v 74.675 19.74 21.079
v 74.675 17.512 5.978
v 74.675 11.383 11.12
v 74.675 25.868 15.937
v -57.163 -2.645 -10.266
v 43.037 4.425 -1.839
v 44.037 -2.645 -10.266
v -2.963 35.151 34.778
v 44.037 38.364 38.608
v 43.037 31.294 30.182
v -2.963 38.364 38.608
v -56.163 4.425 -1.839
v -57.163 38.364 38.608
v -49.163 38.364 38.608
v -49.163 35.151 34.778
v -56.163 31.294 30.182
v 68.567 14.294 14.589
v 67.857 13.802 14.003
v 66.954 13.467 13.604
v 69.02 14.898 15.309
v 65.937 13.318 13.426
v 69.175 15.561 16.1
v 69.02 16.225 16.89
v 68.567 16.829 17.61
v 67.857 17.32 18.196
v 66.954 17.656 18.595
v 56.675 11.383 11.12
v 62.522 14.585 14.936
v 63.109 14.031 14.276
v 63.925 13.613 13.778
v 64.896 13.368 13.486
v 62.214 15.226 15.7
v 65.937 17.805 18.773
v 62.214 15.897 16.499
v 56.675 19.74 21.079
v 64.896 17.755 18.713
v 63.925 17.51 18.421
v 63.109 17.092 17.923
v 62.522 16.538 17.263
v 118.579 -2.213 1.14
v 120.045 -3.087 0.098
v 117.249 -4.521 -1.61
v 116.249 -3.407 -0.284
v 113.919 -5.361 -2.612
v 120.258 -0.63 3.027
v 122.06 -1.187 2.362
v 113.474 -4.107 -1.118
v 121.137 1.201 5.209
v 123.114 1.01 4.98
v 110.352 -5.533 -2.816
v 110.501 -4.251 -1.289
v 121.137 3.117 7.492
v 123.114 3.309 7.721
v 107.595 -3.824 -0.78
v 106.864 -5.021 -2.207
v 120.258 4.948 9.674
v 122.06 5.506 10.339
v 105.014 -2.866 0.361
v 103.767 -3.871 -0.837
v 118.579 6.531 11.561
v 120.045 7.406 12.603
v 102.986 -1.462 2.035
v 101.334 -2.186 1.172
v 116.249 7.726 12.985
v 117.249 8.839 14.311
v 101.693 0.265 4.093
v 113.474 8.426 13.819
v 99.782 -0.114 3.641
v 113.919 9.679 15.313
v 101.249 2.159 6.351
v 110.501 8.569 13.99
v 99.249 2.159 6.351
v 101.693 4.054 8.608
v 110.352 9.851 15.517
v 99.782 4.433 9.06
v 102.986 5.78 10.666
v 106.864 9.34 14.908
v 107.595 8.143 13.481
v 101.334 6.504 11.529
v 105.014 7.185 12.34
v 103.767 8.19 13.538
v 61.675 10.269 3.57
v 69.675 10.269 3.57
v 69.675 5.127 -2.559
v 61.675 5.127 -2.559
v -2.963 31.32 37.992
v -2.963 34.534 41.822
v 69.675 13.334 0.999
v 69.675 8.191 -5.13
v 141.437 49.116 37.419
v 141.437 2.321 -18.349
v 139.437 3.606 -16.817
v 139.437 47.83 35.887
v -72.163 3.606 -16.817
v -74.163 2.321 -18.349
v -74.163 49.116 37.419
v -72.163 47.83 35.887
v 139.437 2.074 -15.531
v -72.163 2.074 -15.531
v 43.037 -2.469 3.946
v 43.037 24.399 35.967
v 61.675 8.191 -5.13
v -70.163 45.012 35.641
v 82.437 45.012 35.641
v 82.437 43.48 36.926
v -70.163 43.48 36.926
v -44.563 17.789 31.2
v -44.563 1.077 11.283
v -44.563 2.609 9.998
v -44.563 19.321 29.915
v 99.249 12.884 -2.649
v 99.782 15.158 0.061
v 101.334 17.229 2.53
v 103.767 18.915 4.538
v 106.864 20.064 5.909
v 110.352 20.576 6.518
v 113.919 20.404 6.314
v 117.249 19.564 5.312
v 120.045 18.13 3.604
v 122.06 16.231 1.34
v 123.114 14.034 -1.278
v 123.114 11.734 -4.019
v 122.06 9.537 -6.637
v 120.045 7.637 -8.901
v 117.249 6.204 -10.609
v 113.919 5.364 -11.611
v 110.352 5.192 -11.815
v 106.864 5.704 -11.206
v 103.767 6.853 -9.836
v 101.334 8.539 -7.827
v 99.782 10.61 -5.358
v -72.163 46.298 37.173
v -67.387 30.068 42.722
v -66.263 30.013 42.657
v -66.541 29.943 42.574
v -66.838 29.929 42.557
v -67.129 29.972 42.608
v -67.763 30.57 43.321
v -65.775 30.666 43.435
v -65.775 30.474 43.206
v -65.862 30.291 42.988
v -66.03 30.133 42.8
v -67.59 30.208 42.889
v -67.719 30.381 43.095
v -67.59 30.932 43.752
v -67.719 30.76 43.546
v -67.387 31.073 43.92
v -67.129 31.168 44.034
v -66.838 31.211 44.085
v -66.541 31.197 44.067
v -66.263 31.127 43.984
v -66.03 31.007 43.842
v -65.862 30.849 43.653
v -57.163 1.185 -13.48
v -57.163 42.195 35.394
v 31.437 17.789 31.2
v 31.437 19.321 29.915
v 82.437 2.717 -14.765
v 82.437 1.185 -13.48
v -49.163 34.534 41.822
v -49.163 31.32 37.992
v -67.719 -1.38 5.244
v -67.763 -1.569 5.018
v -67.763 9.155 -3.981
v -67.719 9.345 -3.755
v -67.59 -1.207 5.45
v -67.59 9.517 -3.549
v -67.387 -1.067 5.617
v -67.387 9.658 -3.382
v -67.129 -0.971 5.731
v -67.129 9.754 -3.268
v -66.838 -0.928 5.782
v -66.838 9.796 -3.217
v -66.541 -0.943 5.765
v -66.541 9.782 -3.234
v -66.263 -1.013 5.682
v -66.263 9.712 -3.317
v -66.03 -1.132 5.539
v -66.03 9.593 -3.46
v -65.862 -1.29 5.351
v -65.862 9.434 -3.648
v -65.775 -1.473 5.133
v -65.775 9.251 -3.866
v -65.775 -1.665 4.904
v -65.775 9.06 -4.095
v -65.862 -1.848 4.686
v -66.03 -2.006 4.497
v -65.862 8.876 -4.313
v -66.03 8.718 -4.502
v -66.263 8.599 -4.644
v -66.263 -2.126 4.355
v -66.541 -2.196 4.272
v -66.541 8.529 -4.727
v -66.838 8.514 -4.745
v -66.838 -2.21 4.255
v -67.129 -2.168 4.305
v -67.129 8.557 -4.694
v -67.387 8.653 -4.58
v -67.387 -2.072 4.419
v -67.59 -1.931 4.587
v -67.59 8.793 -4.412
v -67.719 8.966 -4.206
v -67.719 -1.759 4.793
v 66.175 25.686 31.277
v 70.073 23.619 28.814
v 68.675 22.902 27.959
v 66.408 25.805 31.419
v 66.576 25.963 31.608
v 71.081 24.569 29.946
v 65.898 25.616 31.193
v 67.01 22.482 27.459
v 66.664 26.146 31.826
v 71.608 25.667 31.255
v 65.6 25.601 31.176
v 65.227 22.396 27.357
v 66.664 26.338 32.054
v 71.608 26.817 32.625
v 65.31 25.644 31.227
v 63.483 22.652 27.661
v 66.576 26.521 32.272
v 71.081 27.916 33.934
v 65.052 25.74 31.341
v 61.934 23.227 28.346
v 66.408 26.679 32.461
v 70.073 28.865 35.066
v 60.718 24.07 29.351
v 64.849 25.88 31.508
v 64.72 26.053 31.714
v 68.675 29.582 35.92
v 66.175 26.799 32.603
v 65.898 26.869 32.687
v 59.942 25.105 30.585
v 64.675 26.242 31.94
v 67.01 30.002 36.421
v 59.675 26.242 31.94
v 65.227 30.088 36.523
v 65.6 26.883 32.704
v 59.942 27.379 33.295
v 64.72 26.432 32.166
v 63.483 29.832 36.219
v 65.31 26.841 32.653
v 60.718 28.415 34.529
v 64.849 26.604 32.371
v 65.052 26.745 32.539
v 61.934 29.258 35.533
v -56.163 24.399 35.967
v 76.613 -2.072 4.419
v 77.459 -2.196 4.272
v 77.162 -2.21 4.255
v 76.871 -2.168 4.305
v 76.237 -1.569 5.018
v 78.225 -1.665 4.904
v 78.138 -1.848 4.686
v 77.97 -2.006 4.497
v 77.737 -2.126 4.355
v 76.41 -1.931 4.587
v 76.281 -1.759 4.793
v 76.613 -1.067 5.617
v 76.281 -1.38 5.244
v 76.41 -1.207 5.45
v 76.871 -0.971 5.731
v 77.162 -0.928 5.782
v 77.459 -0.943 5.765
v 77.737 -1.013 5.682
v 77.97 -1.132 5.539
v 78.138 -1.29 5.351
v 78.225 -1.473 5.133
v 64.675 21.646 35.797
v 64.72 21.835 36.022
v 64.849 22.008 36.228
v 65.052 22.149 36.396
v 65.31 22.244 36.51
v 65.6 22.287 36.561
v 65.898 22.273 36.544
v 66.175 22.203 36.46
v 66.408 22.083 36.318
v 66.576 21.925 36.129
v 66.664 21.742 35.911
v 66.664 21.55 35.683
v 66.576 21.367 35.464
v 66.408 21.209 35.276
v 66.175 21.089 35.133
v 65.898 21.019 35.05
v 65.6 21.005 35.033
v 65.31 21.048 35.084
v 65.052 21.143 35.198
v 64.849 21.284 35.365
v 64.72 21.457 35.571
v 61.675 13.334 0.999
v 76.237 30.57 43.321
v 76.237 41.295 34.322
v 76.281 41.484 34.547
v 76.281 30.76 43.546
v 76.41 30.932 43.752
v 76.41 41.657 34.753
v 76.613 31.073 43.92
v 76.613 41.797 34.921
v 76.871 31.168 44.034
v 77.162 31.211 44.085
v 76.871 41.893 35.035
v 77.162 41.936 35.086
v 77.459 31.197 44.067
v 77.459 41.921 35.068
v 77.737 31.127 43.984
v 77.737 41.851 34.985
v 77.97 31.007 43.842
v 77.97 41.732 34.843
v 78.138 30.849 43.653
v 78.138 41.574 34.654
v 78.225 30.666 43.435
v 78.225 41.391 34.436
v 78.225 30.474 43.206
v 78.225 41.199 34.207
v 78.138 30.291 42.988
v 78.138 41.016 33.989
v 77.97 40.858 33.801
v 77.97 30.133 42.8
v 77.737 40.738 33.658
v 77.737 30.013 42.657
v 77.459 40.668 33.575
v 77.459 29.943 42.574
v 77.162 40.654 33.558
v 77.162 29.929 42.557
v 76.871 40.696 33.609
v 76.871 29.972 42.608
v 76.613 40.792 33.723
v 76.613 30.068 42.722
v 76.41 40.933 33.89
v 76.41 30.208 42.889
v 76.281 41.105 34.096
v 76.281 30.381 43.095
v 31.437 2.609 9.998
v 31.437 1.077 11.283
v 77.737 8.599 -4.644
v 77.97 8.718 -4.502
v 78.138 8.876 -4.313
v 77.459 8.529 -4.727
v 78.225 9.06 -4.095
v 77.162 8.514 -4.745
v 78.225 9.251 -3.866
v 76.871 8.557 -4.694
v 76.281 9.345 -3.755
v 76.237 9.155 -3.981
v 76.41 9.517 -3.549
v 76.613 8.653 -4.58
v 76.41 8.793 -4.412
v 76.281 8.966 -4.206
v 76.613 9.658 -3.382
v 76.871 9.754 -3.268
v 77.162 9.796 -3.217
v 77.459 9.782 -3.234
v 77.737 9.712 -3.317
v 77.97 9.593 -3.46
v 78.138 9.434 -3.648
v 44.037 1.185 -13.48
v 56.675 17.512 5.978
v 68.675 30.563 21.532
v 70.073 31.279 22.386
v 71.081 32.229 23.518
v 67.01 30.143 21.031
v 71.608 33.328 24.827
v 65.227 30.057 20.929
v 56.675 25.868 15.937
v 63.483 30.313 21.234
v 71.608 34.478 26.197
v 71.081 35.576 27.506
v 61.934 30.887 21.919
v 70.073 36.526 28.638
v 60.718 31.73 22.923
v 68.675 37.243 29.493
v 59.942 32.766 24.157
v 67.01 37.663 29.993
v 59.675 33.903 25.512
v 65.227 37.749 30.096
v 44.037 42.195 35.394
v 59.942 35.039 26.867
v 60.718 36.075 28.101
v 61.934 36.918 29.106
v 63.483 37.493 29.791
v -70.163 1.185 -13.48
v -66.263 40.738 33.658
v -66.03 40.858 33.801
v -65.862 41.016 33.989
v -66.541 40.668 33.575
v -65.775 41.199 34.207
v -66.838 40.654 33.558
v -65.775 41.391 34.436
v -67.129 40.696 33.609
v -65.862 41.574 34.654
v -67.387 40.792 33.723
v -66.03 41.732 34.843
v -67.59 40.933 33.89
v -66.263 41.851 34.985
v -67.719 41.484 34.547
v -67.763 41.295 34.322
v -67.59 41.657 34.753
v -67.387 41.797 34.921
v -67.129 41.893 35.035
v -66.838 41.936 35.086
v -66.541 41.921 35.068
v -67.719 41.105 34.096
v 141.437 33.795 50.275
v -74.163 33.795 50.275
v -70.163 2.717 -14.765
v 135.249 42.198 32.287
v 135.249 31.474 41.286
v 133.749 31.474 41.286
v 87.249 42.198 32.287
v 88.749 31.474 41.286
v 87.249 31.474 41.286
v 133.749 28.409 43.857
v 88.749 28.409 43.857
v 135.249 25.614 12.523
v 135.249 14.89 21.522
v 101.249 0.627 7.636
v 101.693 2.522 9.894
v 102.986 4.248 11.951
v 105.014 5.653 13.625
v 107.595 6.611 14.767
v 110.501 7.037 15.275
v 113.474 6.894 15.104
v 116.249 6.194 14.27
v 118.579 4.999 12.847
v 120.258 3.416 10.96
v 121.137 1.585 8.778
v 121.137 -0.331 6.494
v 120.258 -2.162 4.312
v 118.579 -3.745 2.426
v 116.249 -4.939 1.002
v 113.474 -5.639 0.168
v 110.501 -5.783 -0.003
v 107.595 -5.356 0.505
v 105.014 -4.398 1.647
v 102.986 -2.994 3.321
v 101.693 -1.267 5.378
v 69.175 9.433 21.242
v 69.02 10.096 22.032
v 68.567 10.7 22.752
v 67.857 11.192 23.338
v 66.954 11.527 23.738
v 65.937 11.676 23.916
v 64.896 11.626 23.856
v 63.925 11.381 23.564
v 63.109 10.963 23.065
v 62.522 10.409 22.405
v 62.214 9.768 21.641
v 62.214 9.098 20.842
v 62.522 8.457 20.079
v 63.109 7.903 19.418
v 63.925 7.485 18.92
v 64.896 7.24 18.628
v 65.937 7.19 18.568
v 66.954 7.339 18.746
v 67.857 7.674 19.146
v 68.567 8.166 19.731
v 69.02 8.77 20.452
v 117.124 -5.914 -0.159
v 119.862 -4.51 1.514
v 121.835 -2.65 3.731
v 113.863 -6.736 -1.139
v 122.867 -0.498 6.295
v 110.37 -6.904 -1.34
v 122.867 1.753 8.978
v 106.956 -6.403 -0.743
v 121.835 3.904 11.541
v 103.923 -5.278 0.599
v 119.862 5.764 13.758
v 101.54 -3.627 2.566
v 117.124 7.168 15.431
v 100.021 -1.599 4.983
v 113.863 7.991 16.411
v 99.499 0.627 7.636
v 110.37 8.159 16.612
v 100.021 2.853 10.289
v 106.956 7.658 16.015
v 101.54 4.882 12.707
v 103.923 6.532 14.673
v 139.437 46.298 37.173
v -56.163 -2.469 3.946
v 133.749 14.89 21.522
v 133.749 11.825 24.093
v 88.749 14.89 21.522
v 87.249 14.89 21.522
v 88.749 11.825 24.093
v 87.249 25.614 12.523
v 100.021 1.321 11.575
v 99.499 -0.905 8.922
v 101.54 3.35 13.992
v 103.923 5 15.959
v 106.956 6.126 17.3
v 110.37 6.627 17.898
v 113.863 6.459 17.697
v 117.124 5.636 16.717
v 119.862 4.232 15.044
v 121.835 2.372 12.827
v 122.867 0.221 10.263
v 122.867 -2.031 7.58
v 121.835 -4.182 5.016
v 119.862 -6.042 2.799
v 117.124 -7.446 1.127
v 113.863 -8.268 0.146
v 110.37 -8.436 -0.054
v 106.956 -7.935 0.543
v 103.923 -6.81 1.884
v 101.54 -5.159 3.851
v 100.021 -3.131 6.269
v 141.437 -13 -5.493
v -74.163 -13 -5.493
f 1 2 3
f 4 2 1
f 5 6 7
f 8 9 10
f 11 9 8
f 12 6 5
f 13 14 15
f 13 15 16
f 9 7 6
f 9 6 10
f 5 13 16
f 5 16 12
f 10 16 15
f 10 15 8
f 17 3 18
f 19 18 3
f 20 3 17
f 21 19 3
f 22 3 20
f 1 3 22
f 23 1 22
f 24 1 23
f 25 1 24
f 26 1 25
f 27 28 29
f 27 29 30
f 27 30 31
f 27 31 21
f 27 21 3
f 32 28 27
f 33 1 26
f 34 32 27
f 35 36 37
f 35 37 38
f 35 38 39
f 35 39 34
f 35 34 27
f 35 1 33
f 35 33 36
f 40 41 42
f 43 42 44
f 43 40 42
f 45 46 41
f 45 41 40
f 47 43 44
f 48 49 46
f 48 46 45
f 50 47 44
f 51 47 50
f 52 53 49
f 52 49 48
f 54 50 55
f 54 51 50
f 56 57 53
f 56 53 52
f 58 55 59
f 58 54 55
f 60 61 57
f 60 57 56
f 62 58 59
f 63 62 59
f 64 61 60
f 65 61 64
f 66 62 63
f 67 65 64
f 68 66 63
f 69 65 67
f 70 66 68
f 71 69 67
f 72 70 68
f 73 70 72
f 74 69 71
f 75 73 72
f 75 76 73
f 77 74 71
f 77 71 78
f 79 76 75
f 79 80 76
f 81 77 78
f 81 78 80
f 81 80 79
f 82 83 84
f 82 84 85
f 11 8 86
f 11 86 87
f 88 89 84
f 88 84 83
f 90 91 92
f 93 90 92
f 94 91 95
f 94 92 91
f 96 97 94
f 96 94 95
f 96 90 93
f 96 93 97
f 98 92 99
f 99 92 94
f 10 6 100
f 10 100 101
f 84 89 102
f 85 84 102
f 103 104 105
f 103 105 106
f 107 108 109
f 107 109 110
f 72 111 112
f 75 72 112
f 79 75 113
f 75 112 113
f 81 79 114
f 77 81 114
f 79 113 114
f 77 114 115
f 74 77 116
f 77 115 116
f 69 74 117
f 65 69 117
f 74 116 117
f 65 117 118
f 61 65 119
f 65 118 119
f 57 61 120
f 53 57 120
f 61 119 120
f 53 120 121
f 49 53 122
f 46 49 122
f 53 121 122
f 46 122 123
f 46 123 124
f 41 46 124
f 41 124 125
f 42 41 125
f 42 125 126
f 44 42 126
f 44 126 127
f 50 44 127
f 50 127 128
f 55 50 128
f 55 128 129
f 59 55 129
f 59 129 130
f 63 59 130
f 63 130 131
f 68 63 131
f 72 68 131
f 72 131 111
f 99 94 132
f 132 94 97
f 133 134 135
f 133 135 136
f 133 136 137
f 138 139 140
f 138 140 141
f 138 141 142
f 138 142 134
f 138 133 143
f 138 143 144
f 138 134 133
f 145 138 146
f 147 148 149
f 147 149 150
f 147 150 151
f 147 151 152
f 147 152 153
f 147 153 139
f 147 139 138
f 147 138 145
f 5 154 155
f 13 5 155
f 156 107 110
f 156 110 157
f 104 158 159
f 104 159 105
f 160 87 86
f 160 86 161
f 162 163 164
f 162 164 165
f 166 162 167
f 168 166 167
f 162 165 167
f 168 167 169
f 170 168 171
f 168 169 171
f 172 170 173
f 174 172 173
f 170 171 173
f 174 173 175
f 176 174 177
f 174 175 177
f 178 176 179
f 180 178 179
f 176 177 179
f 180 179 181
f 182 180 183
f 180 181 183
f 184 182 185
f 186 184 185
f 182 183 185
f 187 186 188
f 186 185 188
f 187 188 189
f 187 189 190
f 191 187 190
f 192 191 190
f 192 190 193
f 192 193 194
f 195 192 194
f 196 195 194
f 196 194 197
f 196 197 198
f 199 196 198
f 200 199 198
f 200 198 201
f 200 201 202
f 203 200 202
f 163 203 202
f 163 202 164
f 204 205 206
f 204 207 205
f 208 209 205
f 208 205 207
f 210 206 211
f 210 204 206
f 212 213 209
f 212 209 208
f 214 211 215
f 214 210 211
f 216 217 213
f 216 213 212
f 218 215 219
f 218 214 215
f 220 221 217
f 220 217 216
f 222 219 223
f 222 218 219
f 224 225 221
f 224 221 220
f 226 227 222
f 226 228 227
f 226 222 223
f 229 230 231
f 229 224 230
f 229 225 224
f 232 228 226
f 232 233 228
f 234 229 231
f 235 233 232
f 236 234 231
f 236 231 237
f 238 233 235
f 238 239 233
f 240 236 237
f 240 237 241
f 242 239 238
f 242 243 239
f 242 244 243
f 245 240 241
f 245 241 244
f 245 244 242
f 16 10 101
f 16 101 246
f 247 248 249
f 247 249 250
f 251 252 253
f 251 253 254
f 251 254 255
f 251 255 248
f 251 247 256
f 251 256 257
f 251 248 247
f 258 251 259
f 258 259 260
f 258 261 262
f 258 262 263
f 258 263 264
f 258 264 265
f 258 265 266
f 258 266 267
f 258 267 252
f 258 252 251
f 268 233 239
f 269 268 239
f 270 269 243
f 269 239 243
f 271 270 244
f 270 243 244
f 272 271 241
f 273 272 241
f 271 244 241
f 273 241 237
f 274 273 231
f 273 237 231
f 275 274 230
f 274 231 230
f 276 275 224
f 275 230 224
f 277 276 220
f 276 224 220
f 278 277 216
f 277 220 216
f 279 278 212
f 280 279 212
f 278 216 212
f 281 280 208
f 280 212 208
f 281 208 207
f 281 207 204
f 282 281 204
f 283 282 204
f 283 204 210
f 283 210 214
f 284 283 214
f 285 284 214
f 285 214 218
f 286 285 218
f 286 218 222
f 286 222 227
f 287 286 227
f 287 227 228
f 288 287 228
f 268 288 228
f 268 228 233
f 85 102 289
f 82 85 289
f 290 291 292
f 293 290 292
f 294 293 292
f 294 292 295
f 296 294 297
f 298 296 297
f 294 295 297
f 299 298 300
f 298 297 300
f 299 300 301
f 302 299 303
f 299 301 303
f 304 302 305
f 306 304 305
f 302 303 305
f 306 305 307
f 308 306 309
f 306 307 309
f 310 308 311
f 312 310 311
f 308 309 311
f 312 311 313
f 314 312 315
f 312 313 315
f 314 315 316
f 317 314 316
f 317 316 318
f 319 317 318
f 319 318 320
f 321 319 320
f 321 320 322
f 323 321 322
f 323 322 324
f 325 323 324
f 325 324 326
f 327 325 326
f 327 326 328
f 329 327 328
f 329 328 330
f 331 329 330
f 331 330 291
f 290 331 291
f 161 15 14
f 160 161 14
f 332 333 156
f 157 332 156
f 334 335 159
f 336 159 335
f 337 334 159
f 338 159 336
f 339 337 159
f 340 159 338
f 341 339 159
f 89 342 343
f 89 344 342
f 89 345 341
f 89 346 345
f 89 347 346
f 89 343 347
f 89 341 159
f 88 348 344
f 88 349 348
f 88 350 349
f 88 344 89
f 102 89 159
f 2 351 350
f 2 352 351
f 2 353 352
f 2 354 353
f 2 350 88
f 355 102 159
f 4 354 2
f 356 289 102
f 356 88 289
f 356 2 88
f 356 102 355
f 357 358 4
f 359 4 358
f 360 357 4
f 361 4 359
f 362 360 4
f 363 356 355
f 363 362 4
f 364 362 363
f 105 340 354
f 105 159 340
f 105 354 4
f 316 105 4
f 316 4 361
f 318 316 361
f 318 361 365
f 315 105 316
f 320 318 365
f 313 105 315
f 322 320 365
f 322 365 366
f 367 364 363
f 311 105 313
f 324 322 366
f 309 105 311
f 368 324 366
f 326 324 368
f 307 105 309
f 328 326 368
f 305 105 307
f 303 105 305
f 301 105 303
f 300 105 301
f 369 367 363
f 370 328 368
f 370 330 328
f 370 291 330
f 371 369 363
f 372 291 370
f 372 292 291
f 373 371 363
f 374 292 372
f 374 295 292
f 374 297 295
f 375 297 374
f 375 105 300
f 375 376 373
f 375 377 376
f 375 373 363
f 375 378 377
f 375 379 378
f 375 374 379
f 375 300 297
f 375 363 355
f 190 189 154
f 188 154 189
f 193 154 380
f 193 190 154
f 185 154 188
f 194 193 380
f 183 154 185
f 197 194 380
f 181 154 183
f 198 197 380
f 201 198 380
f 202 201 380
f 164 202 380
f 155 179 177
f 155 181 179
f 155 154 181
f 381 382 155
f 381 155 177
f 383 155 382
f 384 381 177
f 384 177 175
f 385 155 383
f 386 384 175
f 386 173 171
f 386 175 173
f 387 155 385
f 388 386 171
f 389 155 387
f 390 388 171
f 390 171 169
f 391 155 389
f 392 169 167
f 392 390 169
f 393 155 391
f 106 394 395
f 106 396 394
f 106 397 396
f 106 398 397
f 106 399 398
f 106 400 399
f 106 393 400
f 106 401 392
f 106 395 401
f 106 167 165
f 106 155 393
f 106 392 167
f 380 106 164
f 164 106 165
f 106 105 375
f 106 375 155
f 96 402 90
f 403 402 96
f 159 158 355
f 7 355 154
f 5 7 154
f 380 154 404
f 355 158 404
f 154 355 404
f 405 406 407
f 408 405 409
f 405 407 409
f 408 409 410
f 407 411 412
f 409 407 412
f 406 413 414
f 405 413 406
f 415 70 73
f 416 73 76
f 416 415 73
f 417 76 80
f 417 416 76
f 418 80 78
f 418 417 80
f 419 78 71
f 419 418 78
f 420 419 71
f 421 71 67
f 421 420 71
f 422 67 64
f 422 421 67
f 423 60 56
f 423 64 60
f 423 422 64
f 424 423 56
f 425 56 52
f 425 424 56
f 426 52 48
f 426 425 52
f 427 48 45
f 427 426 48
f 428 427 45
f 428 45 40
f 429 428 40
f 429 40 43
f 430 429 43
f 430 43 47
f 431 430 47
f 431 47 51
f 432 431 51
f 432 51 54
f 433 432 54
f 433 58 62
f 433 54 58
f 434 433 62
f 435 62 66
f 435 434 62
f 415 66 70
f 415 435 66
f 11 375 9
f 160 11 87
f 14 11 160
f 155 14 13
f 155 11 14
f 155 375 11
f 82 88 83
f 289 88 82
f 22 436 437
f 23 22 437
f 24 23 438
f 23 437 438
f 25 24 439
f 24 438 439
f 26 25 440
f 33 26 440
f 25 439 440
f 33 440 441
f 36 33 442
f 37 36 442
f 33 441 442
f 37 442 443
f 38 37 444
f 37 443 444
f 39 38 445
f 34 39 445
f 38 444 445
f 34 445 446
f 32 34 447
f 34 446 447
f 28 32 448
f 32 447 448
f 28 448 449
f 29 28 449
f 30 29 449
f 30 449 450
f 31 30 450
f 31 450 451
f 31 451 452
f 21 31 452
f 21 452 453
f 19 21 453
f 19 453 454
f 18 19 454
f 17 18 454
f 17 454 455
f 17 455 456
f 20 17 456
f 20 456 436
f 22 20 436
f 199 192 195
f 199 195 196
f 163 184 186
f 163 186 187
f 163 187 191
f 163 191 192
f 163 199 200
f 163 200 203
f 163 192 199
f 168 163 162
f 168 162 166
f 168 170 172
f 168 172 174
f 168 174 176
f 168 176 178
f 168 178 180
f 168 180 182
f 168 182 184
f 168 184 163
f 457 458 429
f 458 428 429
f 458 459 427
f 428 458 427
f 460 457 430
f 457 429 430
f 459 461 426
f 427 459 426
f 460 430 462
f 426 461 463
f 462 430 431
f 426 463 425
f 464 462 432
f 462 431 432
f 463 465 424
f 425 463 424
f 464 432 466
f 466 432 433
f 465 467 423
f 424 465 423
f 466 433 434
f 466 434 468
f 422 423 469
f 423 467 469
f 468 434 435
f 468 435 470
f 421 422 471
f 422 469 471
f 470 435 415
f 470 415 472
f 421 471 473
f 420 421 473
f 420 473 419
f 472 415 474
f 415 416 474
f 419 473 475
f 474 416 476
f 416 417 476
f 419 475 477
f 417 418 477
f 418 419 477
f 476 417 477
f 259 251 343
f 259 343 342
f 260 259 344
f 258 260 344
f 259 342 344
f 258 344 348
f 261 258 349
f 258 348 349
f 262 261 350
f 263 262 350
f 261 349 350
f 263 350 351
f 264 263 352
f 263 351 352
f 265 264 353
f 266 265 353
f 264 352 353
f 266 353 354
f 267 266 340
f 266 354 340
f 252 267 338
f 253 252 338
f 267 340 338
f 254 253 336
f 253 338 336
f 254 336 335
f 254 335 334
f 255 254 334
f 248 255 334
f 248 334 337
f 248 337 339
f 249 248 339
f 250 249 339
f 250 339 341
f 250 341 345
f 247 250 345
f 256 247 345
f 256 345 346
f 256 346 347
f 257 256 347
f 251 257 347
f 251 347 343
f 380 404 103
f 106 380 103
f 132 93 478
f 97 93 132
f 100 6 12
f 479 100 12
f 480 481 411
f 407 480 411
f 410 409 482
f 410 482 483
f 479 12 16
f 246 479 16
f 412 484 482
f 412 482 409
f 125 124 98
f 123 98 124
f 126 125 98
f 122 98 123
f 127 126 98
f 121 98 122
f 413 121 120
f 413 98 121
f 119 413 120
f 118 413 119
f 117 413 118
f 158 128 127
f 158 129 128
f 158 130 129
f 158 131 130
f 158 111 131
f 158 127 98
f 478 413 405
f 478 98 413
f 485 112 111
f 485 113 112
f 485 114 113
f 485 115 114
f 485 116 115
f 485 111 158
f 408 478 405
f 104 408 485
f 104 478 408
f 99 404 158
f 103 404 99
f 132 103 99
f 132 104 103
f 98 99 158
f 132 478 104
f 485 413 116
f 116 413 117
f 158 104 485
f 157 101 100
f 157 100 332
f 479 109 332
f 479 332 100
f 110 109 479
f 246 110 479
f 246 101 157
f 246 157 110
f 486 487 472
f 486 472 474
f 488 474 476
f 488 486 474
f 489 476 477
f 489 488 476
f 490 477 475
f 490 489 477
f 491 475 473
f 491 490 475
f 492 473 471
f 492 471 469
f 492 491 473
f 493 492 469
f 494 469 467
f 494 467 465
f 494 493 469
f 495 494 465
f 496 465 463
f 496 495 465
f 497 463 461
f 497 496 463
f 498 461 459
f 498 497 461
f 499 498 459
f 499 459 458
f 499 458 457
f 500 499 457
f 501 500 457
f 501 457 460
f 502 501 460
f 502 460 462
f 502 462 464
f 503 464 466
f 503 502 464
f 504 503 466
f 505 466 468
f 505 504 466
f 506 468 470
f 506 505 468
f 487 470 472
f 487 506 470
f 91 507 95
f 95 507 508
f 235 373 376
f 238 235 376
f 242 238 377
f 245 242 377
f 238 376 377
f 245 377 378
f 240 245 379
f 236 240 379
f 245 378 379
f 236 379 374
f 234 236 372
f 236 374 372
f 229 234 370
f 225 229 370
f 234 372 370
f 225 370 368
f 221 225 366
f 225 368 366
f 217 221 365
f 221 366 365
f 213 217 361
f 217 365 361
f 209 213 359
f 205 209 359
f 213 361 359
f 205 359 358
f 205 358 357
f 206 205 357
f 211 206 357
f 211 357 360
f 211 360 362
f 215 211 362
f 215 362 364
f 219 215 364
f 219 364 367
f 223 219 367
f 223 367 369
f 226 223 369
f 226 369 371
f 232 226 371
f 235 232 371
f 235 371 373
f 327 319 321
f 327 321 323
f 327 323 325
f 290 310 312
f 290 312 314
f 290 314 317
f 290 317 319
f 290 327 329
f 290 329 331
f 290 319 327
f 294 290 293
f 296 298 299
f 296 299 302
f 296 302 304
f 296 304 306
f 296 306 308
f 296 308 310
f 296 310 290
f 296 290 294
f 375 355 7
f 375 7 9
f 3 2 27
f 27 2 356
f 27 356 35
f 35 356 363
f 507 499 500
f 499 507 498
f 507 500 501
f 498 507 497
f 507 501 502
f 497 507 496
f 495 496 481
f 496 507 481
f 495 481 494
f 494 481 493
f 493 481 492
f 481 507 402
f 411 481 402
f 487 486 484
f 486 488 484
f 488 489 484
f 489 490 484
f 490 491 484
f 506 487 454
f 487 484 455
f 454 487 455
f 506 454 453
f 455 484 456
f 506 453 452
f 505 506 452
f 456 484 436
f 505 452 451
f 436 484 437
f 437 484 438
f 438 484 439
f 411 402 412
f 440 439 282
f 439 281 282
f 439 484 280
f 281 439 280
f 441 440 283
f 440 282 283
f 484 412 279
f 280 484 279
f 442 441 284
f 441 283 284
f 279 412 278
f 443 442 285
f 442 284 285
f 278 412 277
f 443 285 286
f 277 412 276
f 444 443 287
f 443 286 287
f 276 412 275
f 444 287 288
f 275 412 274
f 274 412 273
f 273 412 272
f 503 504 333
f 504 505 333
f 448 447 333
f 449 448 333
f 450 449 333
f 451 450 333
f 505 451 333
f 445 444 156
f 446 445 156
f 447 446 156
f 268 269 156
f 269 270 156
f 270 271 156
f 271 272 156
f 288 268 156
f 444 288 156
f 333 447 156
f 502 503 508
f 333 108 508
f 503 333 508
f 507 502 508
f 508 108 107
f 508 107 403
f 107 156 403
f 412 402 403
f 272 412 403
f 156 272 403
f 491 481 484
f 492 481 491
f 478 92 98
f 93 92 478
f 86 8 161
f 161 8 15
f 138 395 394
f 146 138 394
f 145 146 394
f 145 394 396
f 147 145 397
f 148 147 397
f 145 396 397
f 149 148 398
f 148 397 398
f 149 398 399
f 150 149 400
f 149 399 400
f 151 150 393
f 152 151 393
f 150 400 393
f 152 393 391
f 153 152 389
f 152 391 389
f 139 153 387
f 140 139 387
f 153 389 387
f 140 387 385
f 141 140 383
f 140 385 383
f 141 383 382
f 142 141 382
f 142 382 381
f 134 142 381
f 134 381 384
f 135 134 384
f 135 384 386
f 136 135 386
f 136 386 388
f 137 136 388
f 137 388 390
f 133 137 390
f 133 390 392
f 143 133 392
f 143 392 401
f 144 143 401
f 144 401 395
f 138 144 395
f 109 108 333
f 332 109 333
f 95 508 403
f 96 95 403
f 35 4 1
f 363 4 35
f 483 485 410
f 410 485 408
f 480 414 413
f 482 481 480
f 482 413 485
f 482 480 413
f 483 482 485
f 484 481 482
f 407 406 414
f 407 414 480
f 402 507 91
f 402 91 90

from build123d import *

# Parameters (mm, degrees)
F3_W      = 215.6
F3_H      = 72.8
F4_DEPTH  = 20
F5_W      = 76
F5_H      = 26
F5_R      = 3.5
F6_DEPTH  = 55.8480022096
F7_R      = 1
F8_DEPTH  = 18
F9_W      = 99.2
F9_H      = 41.8
F10_DEPTH = 18
F11_R     = 6
F11_R_2   = 1
F12_DEPTH = 14
F13_DEPTH = 55.8480022096
F14_W     = 18
F14_H     = 13
F15_DEPTH = 12
F16_W     = 8
F16_H     = 8
F17_DEPTH = 8
F18_W     = 101.2
F18_H     = 63.8
F19_DEPTH = 9
F20_W     = 46.2
F20_H     = 5
F22_DEPTH = 5
F23_W     = 152.6
F23_H     = 65.8
F24_DEPTH = 4
F25_W     = 45
F25_H     = 25.8
F26_DEPTH = 55.8480022096
F27_W     = 48
F27_H     = 25.8
F28_DEPTH = 16
F29_R     = 10
F30_DEPTH = 55.8480022096
F29_R_2   = 11.75
F31_DEPTH = 2
F32_R     = 12
F33_DEPTH = 16
F34_W     = 211.6
F34_H     = 68.8
F35_DEPTH = 2


with BuildPart() as f4:
    # F3 (on face) → F4 (new body)
    with BuildSketch(Plane(origin=(0, -4.9240387651, 4.1317591117), x_dir=(-1, 0, 0), z_dir=(0, 0.7660444431, -0.6427876097))):
        with Locations((-33.6366042773, 23.835632431)):
            Rectangle(F3_W, F3_H)
    extrude(amount=F4_DEPTH)

    # F5 (on face) → F6 (cut, through all)
    with BuildSketch(Plane(origin=(0, -4.9240387651, 4.1317591117), x_dir=(1, 0, 0), z_dir=(0, -0.7660444431, 0.6427876097))):
        with Locations((-6.5633957227, 22.335632431)):
            Rectangle(F5_W, F5_H)
        with Locations((65.6750798225, 22.335632431)):
            Circle(F5_R)
    extrude(amount=-F6_DEPTH, mode=Mode.SUBTRACT)

    # F7 (on face) → F8 (cut, through all)
    with BuildSketch(Plane(origin=(0, 10.3968500973, -8.7239930821), x_dir=(-1, 0, 0), z_dir=(0, 0.7660444431, -0.6427876097))):
        with Locations((-77.2366042773, 52.835632431)):
            Circle(F7_R)
        with Locations((-77.2366042773, 2.835632431)):
            Circle(F7_R)
        with Locations((66.7633957227, 2.835632431)):
            Circle(F7_R)
        with Locations((66.7633957227, 52.835632431)):
            Circle(F7_R)
    extrude(amount=-F8_DEPTH, mode=Mode.SUBTRACT)

    # F9 (on face) → F10 (cut, through all)
    with BuildSketch(Plane(origin=(0, 10.3968500973, -8.7239930821), x_dir=(-1, 0, 0), z_dir=(0, 0.7660444431, -0.6427876097))):
        with Locations((6.5633957227, 22.335632431)):
            Rectangle(F9_W, F9_H)
    extrude(amount=-F10_DEPTH, mode=Mode.SUBTRACT)

    # F11 (on face) → F12 (cut, through all)
    with BuildSketch(Plane(origin=(0, 10.3968500973, -8.7239930821), x_dir=(-1, 0, 0), z_dir=(0, 0.7660444431, -0.6427876097))):
        with Locations((-65.6750798225, 41.335632431)):
            Circle(F11_R)
        with Locations((-65.6750798225, 41.335632431)):
            Circle(F11_R_2, mode=Mode.SUBTRACT)
        with Locations((-65.6750798225, 41.335632431)):
            Circle(F11_R_2)
    extrude(amount=-F12_DEPTH, mode=Mode.SUBTRACT)

    # F11 (on face) → F13 (cut, through all)
    with BuildSketch(Plane(origin=(0, 10.3968500973, -8.7239930821), x_dir=(-1, 0, 0), z_dir=(0, 0.7660444431, -0.6427876097))):
        with Locations((-65.6750798225, 41.335632431)):
            Circle(F11_R_2)
    extrude(amount=-F13_DEPTH, mode=Mode.SUBTRACT)

    # F14 (on face) → F15 (cut, through all)
    with BuildSketch(Plane(origin=(0, 10.3968500973, -8.7239930821), x_dir=(-1, 0, 0), z_dir=(0, 0.7660444431, -0.6427876097))):
        with Locations((-65.6750798225, 22.335632431)):
            Rectangle(F14_W, F14_H)
    extrude(amount=-F15_DEPTH, mode=Mode.SUBTRACT)

    # F16 (on face) → F17 (cut, through all)
    with BuildSketch(Plane(origin=(0, 10.3968500973, -8.7239930821), x_dir=(-1, 0, 0), z_dir=(0, 0.7660444431, -0.6427876097))):
        with Locations((-65.6750798225, 5.335632431)):
            Rectangle(F16_W, F16_H)
    extrude(amount=-F17_DEPTH, mode=Mode.SUBTRACT)

    # F18 (on face) → F19 (cut, through all)
    with BuildSketch(Plane(origin=(0, 10.3968500973, -8.7239930821), x_dir=(-1, 0, 0), z_dir=(0, 0.7660444431, -0.6427876097))):
        with Locations((6.5633957227, 22.335632431)):
            Rectangle(F18_W, F18_H)
    extrude(amount=-F19_DEPTH, mode=Mode.SUBTRACT)

    # F20 (on face) → F22 (cut)
    with BuildSketch(Plane(origin=(0, 3.5024501092, -2.9389045949), x_dir=(-1, 0, 0), z_dir=(0, 0.7660444431, -0.6427876097))):
        with Locations((26.0633957227, 51.735632431)):
            Rectangle(F20_W, F20_H)
    extrude(amount=-F22_DEPTH, mode=Mode.SUBTRACT)

    # F23 (on face) → F24 (cut, through all)
    with BuildSketch(Plane(origin=(0, 10.3968500973, -8.7239930821), x_dir=(-1, 0, 0), z_dir=(0, 0.7660444431, -0.6427876097))):
        with Locations((-6.1366042773, 23.335632431)):
            Rectangle(F23_W, F23_H)
    extrude(amount=-F24_DEPTH, mode=Mode.SUBTRACT)

    # F25 (on face) → F26 (cut, through all)
    with BuildSketch(Plane(origin=(0, -4.9240387651, 4.1317591117), x_dir=(-1, 0, 0), z_dir=(0, 0.7660444431, -0.6427876097))):
        with Locations((-111.2485080957, 38.9576355718)):
            Rectangle(F25_W, F25_H)
    extrude(amount=F26_DEPTH, mode=Mode.SUBTRACT)

    # F27 (on face) → F28 (cut, through all)
    with BuildSketch(Plane(origin=(0, 10.3968500973, -8.7239930821), x_dir=(-1, 0, 0), z_dir=(0, 0.7660444431, -0.6427876097))):
        with Locations((-111.2485080957, 38.9576355718)):
            Rectangle(F27_W, F27_H)
    extrude(amount=-F28_DEPTH, mode=Mode.SUBTRACT)

    # F29 (on face) → F30 (cut, through all)
    with BuildSketch(Plane(origin=(0, -4.9240387651, 4.1317591117), x_dir=(-1, 0, 0), z_dir=(0, 0.7660444431, -0.6427876097))):
        with Locations((-111.2485080957, 6.2527651899)):
            Circle(F29_R)
    extrude(amount=F30_DEPTH, mode=Mode.SUBTRACT)

    # F29 (on face) → F31 (cut)
    with BuildSketch(Plane(origin=(0, -4.9240387651, 4.1317591117), x_dir=(-1, 0, 0), z_dir=(0, 0.7660444431, -0.6427876097))):
        with Locations((-111.2485080957, 6.2527651899)):
            Circle(F29_R_2)
        with Locations((-111.2485080957, 6.2527651899)):
            Circle(F29_R, mode=Mode.SUBTRACT)
    extrude(amount=F31_DEPTH, mode=Mode.SUBTRACT)

    # F32 (on face) → F33 (cut, through all)
    with BuildSketch(Plane(origin=(0, 10.3968500973, -8.7239930821), x_dir=(-1, 0, 0), z_dir=(0, 0.7660444431, -0.6427876097))):
        with Locations((-111.2485080957, 6.2527651899)):
            Circle(F32_R)
    extrude(amount=-F33_DEPTH, mode=Mode.SUBTRACT)

    # F34 (on face) → F35 (cut)
    with BuildSketch(Plane(origin=(0, 10.3968500973, -8.7239930821), x_dir=(-1, 0, 0), z_dir=(0, 0.7660444431, -0.6427876097))):
        with Locations((-33.6366042773, 23.835632431)):
            Rectangle(F34_W, F34_H)
    extrude(amount=-F35_DEPTH, mode=Mode.SUBTRACT)


solid = f4.part
